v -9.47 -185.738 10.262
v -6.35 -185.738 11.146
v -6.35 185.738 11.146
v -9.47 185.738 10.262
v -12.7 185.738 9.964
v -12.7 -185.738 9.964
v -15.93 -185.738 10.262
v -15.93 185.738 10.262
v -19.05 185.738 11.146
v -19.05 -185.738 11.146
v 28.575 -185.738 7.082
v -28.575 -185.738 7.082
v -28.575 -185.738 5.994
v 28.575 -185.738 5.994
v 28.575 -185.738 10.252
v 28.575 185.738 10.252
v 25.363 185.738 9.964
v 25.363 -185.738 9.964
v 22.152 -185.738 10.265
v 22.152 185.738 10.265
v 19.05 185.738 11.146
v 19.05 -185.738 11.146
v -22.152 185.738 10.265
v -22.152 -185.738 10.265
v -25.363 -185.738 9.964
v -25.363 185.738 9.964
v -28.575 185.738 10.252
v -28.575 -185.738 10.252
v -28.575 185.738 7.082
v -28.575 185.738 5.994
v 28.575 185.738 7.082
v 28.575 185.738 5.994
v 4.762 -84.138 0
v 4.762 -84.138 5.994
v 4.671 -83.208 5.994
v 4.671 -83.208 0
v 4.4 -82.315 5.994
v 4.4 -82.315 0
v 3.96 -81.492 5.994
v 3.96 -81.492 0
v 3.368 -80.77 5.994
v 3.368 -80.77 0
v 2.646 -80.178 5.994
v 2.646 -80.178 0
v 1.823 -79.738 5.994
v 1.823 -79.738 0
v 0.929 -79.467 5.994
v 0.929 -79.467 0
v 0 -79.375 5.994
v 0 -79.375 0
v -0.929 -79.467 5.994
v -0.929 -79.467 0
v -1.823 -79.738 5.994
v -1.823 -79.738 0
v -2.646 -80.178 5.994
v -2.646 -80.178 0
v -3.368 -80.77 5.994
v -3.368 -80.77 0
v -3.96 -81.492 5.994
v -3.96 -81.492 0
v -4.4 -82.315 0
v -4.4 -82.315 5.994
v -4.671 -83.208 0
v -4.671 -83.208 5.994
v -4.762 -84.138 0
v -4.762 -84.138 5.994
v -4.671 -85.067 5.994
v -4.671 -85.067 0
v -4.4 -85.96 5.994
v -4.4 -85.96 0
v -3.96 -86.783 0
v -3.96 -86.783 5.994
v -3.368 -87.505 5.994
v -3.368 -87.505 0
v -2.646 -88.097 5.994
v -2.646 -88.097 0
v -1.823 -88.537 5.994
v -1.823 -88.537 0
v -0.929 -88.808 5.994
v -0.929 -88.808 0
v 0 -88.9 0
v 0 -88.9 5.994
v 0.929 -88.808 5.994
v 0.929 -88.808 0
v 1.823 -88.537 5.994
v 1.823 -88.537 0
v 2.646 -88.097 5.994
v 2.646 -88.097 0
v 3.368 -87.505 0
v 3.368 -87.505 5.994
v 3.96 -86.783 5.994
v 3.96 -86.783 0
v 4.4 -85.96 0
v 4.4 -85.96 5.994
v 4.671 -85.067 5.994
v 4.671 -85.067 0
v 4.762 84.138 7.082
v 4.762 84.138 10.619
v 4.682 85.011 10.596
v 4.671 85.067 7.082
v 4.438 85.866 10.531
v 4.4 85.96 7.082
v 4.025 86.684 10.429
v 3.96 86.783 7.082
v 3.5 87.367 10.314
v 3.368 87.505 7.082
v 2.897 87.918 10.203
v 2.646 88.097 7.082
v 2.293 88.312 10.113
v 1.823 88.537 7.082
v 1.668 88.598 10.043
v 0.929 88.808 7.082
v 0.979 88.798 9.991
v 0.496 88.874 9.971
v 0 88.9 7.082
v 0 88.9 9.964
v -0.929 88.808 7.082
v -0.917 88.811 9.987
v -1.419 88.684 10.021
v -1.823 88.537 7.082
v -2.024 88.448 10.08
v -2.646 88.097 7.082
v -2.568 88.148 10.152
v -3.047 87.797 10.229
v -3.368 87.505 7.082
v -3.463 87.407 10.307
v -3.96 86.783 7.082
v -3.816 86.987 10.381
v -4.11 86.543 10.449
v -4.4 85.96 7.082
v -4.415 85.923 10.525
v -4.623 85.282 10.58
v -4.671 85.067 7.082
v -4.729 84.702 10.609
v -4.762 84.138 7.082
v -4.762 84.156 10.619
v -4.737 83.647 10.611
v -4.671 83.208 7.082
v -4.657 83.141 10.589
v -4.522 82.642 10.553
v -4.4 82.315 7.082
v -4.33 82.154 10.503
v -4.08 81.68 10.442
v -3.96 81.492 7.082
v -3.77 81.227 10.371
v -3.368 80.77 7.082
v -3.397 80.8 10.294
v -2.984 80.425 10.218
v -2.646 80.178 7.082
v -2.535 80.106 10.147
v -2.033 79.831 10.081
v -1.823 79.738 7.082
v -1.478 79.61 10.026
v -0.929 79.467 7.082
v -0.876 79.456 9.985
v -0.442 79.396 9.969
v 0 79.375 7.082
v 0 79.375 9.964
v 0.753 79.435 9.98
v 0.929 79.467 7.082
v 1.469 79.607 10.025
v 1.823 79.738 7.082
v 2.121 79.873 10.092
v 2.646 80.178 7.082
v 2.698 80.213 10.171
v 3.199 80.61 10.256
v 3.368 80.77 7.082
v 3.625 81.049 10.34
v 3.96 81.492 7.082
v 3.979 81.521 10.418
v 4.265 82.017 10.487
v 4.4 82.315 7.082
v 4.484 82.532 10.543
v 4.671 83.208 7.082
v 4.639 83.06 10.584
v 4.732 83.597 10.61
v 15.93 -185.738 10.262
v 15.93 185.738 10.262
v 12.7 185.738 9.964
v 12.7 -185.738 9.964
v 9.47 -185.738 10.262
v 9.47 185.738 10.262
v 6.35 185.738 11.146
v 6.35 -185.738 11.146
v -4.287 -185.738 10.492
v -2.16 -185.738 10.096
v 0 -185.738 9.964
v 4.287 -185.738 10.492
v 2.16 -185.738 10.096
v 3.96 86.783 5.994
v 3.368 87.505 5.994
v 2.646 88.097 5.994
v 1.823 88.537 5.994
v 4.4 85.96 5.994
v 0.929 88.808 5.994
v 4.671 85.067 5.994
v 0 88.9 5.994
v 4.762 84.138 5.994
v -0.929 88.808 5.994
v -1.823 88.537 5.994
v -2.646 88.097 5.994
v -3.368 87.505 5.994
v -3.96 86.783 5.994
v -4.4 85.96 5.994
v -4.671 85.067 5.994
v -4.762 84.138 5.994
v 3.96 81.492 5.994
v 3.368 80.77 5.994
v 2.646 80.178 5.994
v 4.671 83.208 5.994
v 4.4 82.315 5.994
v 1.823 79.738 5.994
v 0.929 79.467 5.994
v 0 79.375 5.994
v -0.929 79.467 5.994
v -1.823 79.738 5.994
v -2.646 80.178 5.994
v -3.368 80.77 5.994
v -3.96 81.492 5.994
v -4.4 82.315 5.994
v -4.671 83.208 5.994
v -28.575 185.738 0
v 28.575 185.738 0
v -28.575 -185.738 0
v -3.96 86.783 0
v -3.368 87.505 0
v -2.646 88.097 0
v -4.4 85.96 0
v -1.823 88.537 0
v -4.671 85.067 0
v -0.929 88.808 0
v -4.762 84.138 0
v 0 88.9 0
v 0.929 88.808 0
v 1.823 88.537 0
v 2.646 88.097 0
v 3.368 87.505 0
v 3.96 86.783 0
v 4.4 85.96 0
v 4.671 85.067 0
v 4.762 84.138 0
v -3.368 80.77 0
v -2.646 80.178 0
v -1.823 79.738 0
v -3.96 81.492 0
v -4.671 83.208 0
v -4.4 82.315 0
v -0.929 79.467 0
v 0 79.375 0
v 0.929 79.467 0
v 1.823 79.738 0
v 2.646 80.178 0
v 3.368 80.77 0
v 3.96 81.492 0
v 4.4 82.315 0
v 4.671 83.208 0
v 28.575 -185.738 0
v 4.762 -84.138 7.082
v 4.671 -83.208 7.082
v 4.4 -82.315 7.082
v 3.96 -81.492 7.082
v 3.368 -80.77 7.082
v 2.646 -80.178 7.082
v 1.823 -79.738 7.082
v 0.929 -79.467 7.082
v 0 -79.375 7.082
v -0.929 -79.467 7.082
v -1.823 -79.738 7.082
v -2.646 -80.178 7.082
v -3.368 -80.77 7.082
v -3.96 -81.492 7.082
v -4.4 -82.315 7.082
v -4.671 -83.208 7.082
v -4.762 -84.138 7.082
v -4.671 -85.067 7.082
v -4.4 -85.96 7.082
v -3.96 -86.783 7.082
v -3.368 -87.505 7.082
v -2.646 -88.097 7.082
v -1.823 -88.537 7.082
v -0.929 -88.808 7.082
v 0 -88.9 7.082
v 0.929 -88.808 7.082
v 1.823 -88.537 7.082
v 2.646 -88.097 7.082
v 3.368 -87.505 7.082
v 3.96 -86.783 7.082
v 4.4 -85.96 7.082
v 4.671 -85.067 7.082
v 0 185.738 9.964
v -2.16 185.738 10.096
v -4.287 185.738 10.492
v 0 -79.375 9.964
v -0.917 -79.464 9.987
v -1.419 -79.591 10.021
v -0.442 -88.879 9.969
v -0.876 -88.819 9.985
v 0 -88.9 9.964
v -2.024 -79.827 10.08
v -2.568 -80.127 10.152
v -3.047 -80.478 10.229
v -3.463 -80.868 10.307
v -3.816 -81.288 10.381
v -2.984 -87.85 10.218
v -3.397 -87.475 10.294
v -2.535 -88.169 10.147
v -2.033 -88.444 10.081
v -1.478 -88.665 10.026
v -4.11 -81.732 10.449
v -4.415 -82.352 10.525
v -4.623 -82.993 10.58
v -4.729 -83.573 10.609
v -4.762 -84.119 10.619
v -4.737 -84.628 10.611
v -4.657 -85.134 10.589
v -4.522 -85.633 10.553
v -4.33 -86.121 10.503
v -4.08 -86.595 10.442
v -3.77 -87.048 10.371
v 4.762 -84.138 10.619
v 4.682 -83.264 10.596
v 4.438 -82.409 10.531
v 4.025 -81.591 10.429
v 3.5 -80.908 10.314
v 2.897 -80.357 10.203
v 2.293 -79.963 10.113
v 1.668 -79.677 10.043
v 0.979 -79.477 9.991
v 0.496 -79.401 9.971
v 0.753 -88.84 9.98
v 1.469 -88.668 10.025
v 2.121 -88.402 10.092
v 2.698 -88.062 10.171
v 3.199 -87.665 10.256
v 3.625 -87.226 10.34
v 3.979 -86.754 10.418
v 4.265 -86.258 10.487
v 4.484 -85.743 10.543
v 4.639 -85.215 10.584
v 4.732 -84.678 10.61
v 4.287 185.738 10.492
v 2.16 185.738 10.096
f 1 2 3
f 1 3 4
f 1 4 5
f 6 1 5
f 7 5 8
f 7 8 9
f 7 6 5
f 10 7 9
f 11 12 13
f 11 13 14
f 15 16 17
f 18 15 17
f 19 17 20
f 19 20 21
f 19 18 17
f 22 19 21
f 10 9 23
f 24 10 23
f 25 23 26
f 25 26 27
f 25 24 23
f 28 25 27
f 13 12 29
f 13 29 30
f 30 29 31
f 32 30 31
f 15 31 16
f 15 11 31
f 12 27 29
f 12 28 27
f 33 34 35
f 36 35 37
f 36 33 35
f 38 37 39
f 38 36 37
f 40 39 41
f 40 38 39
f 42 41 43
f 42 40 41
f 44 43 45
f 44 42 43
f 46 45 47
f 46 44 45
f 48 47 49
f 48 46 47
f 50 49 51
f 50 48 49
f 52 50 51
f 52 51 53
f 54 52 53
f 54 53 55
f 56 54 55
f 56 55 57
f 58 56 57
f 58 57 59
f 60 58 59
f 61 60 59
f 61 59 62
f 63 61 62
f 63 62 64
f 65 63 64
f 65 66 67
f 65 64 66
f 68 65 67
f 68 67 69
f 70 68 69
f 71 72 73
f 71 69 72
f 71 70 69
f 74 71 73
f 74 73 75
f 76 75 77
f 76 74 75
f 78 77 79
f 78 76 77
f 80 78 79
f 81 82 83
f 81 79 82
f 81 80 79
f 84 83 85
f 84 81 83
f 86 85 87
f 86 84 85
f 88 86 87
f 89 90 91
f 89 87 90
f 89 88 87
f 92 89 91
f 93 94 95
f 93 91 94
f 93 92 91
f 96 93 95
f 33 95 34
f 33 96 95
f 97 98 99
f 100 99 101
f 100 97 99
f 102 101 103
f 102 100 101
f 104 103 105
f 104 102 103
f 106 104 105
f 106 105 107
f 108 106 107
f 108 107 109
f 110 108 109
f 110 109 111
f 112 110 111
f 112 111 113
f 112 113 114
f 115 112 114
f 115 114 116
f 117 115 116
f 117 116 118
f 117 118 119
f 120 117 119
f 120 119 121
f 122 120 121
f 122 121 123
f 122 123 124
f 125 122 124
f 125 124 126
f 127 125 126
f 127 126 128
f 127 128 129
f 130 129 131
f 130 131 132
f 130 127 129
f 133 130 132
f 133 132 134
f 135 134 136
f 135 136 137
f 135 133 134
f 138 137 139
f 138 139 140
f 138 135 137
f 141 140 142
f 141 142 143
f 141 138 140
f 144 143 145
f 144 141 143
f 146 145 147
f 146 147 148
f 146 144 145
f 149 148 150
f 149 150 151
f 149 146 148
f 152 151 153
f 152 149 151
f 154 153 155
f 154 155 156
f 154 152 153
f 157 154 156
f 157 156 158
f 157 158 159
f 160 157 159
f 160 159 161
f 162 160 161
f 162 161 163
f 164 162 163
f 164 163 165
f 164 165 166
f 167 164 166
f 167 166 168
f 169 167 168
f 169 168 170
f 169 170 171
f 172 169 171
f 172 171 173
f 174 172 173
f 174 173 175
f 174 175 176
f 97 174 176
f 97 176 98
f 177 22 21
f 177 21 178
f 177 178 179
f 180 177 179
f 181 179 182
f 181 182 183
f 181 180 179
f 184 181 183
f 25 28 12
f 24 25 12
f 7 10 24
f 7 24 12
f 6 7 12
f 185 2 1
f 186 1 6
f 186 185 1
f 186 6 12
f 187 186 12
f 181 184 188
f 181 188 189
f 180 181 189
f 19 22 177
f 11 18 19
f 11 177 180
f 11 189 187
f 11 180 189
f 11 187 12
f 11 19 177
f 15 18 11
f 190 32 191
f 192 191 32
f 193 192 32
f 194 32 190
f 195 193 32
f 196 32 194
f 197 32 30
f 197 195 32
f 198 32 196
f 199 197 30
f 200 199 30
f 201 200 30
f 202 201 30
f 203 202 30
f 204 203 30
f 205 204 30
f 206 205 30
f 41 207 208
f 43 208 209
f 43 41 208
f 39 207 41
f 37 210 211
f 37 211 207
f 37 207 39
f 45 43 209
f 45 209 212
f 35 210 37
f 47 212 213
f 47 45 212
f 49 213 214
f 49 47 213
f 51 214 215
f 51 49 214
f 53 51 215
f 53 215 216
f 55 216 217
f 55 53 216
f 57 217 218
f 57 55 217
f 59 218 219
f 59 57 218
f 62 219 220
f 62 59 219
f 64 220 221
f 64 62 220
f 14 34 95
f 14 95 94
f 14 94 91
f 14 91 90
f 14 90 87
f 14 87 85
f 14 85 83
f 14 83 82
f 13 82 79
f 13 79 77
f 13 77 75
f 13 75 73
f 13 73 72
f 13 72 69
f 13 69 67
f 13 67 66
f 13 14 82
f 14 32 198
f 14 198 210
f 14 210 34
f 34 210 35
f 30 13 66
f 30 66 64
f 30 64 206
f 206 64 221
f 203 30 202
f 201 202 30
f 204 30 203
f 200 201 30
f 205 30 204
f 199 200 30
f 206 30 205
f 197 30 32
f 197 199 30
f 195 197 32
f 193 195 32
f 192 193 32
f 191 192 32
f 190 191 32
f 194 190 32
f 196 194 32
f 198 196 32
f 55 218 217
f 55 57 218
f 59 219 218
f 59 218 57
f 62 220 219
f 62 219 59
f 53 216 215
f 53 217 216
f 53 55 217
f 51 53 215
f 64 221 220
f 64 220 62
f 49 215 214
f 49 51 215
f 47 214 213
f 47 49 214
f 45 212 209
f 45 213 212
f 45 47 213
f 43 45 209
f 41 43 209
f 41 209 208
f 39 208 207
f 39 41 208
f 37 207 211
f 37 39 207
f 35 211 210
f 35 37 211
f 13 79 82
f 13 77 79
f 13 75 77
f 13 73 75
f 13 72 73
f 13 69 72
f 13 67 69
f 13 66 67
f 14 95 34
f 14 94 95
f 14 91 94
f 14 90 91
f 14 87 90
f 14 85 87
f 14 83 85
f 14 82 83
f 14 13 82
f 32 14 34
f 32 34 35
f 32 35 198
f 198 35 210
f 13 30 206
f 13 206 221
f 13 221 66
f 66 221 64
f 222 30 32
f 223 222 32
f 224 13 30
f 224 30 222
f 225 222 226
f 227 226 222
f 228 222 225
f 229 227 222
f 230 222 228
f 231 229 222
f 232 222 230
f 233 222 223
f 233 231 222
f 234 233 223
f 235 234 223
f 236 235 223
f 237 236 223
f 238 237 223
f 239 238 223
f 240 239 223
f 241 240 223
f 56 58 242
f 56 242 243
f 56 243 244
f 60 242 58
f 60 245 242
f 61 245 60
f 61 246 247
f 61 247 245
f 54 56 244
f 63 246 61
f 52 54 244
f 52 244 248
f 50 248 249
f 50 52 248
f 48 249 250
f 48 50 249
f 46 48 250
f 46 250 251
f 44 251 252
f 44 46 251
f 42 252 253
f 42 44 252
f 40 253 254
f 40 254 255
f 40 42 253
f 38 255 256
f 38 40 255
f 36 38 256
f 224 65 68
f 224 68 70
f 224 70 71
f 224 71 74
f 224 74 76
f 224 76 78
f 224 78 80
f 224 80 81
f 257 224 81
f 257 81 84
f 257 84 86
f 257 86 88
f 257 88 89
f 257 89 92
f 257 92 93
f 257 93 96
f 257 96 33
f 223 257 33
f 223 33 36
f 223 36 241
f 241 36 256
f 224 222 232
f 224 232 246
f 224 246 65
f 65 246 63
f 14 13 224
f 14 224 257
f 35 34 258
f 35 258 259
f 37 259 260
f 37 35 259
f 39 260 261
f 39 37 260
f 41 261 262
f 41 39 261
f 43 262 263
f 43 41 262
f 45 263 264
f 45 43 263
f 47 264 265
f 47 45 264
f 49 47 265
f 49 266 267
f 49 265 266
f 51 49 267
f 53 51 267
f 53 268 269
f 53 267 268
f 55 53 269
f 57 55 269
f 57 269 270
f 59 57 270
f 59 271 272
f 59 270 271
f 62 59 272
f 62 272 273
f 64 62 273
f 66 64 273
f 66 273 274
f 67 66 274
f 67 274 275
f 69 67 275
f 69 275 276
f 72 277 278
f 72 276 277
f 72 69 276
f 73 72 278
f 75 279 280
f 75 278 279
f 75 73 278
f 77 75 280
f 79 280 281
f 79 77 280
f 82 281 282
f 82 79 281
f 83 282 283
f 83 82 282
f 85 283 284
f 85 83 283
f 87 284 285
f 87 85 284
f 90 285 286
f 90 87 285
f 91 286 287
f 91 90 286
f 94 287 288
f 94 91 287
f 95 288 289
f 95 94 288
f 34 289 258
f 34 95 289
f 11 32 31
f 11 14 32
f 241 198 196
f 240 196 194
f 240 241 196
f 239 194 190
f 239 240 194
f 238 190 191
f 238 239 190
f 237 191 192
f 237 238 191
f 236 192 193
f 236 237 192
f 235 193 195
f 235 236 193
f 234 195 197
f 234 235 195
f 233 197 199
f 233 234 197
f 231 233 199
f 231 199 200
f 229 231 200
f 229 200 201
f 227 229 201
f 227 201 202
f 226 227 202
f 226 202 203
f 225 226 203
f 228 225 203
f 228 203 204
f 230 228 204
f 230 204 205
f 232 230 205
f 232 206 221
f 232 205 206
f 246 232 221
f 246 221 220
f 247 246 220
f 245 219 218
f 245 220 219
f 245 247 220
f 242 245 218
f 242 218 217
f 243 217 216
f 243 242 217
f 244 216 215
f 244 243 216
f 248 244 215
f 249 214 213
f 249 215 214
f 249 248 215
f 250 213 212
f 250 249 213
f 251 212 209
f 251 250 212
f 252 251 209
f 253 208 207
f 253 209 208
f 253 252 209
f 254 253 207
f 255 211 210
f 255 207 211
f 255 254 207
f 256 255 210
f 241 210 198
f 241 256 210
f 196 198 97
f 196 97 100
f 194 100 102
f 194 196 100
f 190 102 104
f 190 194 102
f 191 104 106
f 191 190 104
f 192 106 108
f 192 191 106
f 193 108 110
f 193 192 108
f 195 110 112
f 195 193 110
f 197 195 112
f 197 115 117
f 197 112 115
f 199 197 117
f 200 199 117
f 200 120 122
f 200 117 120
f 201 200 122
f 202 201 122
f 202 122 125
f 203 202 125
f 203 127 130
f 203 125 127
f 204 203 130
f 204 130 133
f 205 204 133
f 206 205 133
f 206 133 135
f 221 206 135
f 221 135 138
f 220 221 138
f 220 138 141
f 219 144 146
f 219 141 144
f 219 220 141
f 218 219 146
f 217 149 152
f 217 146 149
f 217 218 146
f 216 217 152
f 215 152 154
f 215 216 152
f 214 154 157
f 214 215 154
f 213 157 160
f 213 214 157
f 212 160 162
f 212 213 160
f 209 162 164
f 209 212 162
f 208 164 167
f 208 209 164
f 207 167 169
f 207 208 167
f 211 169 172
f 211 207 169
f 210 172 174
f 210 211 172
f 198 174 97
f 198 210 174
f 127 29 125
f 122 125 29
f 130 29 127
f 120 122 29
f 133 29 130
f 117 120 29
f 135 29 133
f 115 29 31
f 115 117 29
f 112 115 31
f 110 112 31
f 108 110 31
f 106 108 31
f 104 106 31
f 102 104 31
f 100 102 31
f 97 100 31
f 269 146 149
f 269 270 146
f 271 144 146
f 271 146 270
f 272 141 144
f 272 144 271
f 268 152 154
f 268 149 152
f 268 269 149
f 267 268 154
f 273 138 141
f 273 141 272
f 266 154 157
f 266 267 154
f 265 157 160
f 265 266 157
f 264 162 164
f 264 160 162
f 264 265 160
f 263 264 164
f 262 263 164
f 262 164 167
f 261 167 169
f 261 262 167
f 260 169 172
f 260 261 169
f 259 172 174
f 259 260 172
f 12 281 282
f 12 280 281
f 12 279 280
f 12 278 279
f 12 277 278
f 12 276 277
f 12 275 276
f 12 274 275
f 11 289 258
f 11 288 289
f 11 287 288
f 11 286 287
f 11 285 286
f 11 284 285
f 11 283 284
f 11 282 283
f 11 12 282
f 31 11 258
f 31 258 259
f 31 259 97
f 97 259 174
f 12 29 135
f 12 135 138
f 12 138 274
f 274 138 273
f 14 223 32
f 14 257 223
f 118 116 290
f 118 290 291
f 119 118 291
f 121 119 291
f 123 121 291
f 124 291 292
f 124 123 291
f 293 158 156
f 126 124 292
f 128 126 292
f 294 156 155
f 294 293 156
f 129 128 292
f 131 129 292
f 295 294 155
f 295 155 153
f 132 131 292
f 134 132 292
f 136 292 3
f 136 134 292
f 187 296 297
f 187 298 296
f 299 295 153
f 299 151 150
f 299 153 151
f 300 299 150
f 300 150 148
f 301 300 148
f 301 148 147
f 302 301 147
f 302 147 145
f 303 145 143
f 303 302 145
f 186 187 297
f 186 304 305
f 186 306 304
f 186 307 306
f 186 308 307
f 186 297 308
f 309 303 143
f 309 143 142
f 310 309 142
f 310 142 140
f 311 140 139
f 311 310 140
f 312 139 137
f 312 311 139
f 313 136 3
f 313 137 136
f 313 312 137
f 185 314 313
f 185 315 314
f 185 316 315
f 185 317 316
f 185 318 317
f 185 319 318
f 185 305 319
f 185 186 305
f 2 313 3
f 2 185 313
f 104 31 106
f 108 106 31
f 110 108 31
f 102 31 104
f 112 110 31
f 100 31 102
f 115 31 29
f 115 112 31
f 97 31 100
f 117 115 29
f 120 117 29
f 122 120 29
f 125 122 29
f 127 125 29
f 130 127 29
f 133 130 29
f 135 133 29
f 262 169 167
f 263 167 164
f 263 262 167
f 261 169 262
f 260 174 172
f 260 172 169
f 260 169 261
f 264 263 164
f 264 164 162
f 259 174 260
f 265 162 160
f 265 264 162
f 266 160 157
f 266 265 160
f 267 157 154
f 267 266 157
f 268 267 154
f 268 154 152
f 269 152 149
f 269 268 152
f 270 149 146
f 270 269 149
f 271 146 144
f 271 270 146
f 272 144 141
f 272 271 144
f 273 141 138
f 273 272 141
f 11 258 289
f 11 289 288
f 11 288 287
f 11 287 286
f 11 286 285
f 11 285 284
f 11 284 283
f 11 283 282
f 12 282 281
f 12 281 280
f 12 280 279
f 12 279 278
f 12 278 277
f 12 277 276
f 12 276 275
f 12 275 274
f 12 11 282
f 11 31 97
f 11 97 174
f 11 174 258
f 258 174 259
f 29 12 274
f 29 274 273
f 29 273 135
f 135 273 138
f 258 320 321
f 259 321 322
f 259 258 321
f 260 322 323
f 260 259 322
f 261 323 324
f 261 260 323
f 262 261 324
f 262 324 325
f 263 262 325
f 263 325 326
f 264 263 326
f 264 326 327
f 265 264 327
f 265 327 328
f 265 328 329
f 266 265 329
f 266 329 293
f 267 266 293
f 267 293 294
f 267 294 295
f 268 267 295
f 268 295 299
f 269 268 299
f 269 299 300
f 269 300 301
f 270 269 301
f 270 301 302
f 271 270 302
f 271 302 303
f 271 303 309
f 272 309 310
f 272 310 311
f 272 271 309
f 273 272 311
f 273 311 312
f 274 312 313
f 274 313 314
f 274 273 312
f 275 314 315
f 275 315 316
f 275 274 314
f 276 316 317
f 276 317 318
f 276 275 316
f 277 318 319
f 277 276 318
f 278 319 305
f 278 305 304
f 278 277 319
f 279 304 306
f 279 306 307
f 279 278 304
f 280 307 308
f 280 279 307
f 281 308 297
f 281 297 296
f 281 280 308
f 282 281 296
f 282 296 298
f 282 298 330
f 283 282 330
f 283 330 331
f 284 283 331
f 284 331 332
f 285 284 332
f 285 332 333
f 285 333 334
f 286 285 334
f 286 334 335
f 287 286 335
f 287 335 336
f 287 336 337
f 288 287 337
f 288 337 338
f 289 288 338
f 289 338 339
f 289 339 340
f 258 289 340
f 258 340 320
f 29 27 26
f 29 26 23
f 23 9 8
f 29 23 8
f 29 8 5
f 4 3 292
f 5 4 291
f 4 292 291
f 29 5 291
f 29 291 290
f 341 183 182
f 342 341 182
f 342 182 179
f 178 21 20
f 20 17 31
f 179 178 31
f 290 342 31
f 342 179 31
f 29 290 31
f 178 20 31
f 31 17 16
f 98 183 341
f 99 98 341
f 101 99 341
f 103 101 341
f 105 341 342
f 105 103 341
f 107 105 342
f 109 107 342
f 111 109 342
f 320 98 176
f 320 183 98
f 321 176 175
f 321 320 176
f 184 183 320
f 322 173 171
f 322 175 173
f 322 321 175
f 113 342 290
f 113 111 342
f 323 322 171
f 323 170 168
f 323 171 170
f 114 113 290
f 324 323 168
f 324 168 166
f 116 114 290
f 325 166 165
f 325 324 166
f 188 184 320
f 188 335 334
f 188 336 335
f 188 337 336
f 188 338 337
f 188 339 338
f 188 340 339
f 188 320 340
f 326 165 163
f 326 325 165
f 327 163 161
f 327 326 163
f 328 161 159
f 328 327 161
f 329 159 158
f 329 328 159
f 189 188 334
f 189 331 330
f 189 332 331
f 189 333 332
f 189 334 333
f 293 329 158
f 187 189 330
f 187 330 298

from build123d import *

# Parameters (mm, degrees)
F1_DEPTH = 185.7375
F2_DEPTH = 185.7375
F3_DEPTH = 185.7375
F4_R     = 4.7625
F5_DEPTH = 25.4


with BuildPart() as f1:
    # F0 (on Front) → F1 (new body, symmetric)
    with BuildSketch(Plane.XZ):
        Polygon((0, 0), (28.575, 0), (28.575, 5.9944), (0, 5.9944), (-28.575, 5.9944), (-28.575, 0), align=None)
    extrude(amount=F1_DEPTH, both=True)


with BuildPart() as f2:
    # F0 (on Front) → F2 (new body, symmetric)
    with BuildSketch(Plane.XZ):
        Polygon((0, 5.9944), (28.575, 5.9944), (28.575, 7.081965), (0, 7.081965), (-28.575, 7.081965), (-28.575, 5.9944), align=None)
    extrude(amount=F2_DEPTH, both=True)


with BuildPart() as f3:
    # F0 (on Front) → F3 (new body, symmetric)
    with BuildSketch(Plane.XZ):
        with BuildLine():
            Line((0, 7.081965), (28.575, 7.081965))
            Line((28.575, 7.081965), (28.575, 10.251668))
            ThreePointArc((28.575, 10.251668), (23.750728, 10.040894), (19.05, 11.145965))
            ThreePointArc((19.05, 11.145965), (12.7, 9.963639), (6.35, 11.145965))
            ThreePointArc((6.35, 11.145965), (3.229566, 10.261739), (0, 9.963639))
            ThreePointArc((0, 9.963639), (-3.229566, 10.261739), (-6.35, 11.145965))
            ThreePointArc((-6.35, 11.145965), (-12.7, 9.963639), (-19.05, 11.145965))
            ThreePointArc((-19.05, 11.145965), (-23.750728, 10.040894), (-28.575, 10.251668))
            Line((-28.575, 10.251668), (-28.575, 7.081965))
            Line((-28.575, 7.081965), (0, 7.081965))
        make_face()
    extrude(amount=F3_DEPTH, both=True)


with BuildPart() as f5_tool:
    # F4 (on Top) → F5 (new body)
    with BuildSketch(Plane.XY):
        with Locations((0, 84.1375)):
            Circle(F4_R)
        with Locations((0, -84.1375)):
            Circle(F4_R)
    extrude(amount=F5_DEPTH)


with BuildPart() as f1_1:
    add(f1.part)

    # F5: cut by f5_tool
    add(f5_tool.part, mode=Mode.SUBTRACT)


with BuildPart() as f2_1:
    add(f2.part)

    # F5: cut by f5_tool
    add(f5_tool.part, mode=Mode.SUBTRACT)


with BuildPart() as f3_1:
    add(f3.part)

    # F5: cut by f5_tool
    add(f5_tool.part, mode=Mode.SUBTRACT)


solid = Compound([f1_1.part, f2_1.part, f3_1.part])
